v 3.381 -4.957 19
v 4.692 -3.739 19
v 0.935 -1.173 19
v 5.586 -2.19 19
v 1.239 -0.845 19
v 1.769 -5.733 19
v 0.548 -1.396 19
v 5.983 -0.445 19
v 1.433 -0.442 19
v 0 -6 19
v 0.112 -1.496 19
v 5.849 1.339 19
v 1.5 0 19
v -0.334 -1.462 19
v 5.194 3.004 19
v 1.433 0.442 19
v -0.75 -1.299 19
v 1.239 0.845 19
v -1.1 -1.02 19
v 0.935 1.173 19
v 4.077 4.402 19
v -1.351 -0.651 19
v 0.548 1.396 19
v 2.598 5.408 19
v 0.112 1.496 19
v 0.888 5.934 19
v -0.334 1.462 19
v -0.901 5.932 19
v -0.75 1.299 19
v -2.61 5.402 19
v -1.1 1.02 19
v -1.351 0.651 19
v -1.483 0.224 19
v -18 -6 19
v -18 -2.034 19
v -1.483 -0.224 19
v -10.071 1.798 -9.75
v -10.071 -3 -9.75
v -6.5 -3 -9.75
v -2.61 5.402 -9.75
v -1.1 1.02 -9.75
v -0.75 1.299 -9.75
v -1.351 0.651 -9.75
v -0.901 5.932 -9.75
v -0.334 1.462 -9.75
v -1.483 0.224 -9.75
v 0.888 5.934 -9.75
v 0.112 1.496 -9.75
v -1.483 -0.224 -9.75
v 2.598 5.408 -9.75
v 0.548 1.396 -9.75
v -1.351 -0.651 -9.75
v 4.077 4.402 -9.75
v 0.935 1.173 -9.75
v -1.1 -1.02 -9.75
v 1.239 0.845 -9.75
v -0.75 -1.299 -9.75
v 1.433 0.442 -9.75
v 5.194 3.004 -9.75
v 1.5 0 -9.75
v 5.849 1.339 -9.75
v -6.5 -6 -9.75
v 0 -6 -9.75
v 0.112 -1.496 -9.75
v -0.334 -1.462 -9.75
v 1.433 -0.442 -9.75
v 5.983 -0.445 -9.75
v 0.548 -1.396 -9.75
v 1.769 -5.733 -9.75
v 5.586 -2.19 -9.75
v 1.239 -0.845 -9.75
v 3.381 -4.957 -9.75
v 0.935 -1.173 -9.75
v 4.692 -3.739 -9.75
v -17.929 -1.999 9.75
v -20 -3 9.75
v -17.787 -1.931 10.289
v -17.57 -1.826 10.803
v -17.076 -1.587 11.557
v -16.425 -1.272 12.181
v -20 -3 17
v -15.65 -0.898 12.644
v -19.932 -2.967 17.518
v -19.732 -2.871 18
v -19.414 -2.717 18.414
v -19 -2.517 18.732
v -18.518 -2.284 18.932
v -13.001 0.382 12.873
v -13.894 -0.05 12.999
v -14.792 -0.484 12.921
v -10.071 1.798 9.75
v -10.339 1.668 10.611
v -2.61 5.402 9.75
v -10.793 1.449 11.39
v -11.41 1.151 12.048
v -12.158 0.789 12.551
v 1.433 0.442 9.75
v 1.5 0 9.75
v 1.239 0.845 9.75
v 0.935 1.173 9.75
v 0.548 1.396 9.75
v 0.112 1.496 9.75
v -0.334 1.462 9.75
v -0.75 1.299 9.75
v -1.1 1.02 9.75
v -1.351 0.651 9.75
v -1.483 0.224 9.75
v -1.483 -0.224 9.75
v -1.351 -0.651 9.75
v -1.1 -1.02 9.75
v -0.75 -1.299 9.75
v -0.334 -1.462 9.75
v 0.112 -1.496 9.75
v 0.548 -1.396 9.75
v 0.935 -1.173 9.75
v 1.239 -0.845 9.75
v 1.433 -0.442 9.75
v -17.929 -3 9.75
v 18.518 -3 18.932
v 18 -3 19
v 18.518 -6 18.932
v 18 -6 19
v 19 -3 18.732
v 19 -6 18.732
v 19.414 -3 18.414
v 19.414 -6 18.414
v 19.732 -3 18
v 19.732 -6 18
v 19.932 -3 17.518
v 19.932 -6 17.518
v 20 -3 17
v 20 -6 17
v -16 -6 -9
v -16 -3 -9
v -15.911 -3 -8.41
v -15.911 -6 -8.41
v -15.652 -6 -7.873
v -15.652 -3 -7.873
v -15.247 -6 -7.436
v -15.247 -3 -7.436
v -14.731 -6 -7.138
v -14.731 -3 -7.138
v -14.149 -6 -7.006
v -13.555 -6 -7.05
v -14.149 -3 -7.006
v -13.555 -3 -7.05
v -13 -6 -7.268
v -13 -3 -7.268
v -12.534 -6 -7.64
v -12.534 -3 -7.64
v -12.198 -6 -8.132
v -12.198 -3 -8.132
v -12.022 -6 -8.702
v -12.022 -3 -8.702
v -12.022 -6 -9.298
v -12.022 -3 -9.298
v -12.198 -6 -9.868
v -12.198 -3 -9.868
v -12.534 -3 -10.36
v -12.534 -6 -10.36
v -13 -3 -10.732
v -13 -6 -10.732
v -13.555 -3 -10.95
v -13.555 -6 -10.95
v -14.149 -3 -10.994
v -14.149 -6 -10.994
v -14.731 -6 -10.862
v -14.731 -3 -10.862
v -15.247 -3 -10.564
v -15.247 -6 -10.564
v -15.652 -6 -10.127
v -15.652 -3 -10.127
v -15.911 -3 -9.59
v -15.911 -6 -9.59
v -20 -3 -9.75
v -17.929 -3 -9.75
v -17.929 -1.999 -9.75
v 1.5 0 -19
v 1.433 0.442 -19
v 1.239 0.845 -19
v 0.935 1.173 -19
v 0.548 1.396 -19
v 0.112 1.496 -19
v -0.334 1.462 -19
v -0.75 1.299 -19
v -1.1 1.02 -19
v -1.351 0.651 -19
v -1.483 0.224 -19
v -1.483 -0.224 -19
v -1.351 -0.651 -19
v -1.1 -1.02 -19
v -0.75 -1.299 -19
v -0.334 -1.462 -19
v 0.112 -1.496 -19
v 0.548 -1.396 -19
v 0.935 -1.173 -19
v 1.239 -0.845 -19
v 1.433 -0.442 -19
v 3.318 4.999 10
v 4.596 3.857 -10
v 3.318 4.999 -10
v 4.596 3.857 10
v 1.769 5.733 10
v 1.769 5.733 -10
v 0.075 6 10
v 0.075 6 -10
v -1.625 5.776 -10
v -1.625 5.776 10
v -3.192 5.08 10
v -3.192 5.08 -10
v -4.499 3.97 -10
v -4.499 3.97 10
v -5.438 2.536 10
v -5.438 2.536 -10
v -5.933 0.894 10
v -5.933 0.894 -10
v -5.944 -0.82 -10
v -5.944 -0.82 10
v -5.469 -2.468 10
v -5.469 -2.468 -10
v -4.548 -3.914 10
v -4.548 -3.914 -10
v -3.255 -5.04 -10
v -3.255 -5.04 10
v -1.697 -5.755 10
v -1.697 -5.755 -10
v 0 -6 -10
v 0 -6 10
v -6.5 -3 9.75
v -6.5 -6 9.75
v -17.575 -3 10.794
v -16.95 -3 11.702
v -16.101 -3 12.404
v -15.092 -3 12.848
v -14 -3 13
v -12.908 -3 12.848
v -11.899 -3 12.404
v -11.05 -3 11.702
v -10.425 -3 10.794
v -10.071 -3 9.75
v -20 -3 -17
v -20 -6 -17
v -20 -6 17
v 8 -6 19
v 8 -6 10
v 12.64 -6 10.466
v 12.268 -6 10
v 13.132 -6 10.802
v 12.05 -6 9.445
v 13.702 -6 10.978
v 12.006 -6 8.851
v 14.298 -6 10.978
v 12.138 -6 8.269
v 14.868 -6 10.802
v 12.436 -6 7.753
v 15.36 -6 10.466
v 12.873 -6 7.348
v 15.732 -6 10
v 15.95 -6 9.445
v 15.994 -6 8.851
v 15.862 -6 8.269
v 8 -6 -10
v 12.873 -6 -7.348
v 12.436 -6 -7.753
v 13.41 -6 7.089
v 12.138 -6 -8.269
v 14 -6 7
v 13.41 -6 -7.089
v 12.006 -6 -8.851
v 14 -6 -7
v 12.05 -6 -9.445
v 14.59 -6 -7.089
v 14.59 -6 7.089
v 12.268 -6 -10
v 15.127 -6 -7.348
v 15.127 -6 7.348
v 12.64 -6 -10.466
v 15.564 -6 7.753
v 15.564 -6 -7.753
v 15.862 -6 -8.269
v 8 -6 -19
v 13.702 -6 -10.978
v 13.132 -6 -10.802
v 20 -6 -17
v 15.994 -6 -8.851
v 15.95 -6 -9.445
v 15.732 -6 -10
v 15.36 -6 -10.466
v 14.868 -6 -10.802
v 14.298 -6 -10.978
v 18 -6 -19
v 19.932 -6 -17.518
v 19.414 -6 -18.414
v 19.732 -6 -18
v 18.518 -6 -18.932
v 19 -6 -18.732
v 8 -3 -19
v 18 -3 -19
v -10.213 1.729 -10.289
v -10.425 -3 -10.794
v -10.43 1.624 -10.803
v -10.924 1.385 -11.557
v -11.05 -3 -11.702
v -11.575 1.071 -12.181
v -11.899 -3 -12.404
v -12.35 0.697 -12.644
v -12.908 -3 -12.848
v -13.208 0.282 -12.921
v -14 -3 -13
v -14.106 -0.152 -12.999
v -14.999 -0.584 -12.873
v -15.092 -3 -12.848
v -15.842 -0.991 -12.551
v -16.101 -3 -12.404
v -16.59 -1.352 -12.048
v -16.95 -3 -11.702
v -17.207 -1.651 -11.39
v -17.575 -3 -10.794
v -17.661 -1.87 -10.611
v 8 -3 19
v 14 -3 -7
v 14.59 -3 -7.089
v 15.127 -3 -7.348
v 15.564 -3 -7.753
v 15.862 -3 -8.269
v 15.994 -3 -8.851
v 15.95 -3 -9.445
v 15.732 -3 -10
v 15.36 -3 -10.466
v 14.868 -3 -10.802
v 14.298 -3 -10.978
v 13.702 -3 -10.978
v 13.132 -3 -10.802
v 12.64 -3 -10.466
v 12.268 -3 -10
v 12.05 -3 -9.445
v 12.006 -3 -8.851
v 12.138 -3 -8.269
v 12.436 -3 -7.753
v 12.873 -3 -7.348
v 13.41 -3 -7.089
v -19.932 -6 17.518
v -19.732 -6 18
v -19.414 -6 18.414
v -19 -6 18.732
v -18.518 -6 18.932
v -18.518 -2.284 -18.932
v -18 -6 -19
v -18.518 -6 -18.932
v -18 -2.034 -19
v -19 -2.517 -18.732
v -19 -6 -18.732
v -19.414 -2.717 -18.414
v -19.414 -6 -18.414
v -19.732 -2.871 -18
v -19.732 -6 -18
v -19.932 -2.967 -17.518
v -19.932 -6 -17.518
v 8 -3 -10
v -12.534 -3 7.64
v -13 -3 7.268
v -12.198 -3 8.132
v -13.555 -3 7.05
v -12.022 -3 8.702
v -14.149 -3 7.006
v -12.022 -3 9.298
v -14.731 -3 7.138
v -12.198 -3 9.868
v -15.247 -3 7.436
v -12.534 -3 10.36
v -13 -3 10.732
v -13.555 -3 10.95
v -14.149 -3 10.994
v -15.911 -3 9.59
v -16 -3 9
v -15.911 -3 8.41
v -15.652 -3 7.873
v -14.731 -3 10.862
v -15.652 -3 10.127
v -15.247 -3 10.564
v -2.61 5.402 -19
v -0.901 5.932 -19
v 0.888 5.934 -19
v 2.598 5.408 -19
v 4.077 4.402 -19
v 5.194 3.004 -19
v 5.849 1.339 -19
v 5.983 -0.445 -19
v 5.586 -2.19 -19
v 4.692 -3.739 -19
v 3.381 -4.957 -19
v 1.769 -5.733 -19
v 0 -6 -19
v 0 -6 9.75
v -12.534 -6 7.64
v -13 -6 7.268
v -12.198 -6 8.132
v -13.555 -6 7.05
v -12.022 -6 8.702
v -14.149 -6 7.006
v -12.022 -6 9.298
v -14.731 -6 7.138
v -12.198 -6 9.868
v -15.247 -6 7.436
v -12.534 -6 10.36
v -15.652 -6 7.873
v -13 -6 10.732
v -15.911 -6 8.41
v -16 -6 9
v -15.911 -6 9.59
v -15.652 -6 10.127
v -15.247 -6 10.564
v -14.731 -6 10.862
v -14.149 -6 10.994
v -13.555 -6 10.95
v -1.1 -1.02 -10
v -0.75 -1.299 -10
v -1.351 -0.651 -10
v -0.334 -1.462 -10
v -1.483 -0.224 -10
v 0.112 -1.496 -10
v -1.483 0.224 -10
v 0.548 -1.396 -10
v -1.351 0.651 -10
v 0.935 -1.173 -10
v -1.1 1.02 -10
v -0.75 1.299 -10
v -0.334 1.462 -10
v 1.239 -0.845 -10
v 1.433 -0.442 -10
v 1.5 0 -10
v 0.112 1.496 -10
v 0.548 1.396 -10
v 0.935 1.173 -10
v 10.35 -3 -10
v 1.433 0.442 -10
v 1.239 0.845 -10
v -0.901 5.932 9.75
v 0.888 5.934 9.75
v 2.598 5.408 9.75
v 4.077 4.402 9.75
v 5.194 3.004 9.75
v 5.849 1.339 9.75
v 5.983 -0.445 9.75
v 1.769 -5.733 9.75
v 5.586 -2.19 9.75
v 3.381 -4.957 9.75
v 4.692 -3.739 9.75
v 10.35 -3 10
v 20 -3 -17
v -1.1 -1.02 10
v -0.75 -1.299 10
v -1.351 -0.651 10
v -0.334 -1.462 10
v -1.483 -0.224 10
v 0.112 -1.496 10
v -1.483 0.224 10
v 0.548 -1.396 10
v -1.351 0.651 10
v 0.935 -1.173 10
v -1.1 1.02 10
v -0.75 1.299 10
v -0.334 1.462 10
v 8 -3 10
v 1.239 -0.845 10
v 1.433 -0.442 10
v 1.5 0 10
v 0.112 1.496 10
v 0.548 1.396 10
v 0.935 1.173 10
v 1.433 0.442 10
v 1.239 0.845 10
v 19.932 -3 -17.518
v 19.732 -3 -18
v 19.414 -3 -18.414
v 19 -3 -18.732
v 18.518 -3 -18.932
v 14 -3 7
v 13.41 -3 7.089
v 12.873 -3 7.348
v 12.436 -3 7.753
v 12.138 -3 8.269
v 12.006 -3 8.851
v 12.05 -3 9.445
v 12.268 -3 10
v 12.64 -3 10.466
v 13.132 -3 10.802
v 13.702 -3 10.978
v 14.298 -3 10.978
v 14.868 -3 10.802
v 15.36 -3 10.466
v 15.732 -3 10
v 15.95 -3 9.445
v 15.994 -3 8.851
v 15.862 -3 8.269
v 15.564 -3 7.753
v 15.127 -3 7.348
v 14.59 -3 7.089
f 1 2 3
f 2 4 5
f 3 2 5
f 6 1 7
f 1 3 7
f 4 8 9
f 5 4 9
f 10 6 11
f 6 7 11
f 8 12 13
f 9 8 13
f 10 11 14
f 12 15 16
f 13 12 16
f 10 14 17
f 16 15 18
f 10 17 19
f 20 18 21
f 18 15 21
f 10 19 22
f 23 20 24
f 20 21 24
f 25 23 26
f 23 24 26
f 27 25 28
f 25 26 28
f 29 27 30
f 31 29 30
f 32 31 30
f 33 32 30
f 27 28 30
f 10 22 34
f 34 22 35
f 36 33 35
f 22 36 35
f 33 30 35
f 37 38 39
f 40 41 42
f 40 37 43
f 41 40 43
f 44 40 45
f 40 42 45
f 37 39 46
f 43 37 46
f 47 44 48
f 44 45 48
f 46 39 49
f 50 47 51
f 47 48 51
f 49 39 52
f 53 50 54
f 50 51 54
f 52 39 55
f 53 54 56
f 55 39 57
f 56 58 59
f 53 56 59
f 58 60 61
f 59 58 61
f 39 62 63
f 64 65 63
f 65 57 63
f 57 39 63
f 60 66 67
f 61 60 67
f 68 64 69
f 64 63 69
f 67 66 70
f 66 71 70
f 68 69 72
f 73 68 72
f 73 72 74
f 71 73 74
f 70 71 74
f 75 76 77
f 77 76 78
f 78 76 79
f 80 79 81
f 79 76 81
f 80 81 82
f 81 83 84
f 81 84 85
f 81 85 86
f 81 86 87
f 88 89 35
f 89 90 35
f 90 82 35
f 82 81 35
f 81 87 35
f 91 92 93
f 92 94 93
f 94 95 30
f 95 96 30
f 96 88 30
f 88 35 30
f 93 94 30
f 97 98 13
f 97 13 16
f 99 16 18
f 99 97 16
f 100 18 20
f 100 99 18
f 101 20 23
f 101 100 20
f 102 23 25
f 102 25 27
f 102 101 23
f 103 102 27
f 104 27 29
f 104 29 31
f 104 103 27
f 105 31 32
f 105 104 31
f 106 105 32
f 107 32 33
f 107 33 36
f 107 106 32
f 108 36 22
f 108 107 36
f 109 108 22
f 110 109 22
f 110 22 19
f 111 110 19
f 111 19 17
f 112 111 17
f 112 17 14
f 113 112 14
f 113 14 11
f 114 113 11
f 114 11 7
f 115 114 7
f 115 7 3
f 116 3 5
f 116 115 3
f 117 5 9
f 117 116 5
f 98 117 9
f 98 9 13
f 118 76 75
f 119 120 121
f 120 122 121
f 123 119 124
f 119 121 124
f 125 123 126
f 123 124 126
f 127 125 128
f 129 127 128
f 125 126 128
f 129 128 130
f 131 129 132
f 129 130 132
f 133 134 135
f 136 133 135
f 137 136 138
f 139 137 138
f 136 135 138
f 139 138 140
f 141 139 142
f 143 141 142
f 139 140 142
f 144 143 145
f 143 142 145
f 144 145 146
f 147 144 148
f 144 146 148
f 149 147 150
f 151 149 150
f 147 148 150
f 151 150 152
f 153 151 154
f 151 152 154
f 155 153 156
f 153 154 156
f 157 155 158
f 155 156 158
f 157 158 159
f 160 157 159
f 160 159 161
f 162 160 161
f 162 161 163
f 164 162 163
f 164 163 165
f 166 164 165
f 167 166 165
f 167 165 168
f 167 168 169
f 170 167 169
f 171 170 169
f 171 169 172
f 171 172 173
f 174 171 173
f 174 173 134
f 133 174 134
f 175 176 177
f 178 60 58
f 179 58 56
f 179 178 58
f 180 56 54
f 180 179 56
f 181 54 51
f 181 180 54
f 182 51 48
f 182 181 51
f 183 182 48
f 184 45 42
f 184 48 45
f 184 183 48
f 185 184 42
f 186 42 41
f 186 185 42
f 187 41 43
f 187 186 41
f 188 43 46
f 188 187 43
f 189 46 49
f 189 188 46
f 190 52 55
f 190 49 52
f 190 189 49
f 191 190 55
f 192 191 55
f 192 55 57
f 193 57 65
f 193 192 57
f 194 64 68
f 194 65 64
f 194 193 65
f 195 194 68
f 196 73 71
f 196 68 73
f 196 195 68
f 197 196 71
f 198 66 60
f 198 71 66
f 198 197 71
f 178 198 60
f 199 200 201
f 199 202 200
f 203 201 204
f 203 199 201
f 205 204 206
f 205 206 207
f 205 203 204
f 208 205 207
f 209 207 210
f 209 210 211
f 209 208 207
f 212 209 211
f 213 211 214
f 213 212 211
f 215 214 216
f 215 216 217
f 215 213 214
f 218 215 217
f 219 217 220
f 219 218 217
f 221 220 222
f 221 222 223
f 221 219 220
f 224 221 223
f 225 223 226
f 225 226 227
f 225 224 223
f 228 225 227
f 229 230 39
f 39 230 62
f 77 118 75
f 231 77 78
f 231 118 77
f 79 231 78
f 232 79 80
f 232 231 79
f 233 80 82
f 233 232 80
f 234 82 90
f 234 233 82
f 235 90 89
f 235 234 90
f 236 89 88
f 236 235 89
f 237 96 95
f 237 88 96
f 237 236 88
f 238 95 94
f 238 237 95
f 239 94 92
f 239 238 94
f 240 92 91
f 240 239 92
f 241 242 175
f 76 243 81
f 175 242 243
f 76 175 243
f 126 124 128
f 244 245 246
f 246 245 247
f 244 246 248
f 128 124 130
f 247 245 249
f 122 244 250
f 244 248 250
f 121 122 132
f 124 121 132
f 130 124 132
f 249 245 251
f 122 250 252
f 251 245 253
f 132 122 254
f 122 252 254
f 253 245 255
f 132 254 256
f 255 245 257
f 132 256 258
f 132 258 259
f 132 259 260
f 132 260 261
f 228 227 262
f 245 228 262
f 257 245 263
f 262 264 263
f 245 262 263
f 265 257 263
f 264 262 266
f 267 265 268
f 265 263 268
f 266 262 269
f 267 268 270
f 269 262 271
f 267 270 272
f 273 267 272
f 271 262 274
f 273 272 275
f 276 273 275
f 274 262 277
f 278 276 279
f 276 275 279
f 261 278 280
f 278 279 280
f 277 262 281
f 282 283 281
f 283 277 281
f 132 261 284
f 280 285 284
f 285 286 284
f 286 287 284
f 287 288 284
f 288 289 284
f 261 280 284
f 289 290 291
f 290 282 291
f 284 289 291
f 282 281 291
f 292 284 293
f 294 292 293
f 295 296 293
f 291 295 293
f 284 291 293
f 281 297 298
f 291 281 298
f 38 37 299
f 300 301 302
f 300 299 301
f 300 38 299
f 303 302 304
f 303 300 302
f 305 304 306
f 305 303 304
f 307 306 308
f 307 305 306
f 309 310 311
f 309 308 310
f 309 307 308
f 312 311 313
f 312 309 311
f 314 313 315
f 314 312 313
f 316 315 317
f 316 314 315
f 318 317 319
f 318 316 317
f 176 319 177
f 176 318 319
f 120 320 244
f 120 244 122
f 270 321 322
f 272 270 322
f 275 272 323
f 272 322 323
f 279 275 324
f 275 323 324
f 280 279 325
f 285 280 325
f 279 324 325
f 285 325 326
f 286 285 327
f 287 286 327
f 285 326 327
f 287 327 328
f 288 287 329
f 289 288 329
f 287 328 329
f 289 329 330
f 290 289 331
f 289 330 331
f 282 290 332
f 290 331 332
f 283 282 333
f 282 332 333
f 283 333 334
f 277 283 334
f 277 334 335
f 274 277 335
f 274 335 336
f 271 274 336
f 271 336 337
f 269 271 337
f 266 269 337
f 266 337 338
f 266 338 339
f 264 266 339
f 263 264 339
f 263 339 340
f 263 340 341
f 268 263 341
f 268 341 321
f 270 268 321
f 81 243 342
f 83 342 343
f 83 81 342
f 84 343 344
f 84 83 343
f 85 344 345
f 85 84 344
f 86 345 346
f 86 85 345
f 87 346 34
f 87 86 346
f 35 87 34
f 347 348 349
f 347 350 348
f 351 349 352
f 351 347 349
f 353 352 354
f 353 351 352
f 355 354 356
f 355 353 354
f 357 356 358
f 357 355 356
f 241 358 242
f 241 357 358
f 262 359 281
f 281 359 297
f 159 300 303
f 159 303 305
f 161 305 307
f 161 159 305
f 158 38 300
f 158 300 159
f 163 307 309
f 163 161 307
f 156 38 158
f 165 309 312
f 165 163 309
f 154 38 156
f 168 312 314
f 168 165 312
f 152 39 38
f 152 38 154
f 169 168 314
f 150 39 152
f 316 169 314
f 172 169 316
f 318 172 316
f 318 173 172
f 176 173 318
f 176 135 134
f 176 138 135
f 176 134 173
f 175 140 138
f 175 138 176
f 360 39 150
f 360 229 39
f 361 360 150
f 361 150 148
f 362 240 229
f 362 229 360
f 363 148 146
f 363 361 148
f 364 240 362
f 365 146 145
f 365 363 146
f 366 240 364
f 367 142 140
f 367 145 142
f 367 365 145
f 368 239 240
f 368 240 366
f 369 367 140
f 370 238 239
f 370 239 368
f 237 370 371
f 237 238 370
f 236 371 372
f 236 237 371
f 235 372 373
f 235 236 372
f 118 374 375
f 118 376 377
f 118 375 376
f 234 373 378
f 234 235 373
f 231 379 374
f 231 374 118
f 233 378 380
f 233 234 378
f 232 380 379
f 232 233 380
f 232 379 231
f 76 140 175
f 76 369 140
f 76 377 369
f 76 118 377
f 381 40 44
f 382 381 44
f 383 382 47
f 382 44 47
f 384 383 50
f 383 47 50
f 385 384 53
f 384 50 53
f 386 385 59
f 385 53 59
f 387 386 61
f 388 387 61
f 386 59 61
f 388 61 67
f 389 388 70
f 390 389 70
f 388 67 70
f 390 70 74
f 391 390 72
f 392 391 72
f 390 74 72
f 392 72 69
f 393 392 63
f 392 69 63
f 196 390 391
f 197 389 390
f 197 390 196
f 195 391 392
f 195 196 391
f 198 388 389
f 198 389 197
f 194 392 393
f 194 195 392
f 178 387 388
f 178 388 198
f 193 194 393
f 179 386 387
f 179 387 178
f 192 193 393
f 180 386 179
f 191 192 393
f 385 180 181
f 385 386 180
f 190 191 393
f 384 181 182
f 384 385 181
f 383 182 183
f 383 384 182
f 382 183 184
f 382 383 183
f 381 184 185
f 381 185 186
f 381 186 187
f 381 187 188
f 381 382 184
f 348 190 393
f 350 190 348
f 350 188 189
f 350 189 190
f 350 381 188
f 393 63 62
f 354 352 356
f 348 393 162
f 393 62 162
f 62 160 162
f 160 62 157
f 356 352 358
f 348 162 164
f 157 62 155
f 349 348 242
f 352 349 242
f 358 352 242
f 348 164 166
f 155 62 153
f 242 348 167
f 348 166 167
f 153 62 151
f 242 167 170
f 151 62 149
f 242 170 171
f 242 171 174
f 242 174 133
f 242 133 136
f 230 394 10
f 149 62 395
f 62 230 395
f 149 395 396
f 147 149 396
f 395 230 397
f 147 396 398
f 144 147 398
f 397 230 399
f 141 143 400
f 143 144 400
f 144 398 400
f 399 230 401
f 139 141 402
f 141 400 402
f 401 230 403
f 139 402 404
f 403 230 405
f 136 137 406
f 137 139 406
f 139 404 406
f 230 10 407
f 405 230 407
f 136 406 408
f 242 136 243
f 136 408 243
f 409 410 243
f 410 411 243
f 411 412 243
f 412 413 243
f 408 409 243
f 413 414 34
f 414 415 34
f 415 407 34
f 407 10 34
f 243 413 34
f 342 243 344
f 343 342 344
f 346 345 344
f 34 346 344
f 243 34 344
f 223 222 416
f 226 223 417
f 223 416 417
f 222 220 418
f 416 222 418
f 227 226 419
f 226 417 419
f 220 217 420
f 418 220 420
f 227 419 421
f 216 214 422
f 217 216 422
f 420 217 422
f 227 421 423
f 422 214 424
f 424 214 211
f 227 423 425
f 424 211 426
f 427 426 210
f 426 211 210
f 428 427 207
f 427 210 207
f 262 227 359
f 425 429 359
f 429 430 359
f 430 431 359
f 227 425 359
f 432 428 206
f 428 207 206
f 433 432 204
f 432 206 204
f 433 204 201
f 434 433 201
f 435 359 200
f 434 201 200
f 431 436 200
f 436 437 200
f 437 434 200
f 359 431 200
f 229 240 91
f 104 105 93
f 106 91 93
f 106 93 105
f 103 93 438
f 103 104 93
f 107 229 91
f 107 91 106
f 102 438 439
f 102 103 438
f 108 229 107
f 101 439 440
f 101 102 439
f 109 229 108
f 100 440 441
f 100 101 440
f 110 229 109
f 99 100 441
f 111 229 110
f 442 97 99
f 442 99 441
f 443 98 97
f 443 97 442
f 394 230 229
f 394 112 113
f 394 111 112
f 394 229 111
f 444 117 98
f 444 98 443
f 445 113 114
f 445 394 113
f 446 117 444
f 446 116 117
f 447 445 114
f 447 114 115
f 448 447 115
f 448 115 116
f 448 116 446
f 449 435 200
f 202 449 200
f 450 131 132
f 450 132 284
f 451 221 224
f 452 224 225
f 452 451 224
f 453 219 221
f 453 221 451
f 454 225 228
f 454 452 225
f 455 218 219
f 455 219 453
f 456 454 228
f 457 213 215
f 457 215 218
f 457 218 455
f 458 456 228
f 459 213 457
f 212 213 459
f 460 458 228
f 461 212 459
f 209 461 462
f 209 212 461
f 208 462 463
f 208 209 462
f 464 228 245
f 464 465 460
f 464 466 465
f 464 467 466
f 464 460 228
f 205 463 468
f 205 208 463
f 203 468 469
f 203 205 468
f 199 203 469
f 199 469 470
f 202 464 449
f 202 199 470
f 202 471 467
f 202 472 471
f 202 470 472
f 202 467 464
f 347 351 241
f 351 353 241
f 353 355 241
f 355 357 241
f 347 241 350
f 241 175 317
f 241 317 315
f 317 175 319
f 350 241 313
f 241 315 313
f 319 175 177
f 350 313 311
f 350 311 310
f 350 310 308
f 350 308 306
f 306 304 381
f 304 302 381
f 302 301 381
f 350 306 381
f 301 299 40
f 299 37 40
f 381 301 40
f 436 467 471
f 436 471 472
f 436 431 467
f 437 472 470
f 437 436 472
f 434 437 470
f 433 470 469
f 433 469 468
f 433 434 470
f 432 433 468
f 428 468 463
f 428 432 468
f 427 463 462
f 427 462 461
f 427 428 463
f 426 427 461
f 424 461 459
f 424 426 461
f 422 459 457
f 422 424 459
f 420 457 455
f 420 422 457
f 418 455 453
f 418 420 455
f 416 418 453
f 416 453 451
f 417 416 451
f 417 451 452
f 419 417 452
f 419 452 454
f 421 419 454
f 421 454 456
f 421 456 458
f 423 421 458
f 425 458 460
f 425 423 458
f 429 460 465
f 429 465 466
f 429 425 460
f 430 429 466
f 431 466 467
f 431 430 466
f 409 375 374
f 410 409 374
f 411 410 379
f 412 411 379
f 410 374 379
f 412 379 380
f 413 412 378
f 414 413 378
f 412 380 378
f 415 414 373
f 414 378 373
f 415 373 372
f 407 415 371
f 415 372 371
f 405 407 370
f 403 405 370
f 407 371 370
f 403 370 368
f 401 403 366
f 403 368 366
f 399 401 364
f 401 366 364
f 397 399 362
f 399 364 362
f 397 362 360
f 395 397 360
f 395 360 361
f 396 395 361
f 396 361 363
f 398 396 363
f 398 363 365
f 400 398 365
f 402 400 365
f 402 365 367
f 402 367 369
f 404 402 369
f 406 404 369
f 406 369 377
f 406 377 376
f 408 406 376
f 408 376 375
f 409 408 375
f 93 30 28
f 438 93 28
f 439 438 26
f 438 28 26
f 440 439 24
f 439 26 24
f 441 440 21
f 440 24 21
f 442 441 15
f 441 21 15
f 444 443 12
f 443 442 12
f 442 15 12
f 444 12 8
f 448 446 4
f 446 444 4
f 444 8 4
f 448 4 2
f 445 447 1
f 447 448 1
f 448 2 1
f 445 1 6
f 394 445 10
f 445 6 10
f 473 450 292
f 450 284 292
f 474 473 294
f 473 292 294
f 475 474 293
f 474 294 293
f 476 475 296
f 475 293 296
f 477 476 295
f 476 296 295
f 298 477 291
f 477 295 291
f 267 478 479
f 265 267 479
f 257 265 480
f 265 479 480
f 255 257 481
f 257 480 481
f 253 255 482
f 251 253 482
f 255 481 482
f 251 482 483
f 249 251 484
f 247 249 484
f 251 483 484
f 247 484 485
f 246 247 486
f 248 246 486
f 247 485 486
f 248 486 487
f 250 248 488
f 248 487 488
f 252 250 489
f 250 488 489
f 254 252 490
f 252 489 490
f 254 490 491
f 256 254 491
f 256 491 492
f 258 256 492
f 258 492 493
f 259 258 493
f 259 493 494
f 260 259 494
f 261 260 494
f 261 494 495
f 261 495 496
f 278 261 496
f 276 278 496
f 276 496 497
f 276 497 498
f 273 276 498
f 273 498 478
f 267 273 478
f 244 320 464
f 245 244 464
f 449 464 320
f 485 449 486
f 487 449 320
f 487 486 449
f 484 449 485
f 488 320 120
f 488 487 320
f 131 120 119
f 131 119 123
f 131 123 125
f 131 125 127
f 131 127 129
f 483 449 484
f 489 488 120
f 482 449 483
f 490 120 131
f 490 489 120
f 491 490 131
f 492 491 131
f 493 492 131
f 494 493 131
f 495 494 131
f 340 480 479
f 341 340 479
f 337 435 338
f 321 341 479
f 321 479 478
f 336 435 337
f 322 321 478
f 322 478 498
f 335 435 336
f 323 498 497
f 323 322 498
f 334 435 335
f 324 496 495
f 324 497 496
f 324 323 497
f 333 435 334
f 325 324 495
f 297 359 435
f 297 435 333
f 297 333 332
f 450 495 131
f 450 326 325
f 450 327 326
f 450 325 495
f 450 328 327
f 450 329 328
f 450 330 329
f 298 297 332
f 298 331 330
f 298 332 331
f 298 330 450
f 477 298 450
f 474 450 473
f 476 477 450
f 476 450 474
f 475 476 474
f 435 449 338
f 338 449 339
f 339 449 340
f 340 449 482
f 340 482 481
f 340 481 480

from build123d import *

# Parameters (mm, degrees)
SKETCH_1_R               = 1.5
EXTRUDE_1_DEPTH          = 10
SKETCH_2_W               = 12
SKETCH_2_H               = 38
EXTRUDE_2_DEPTH          = 3
SKETCH_3_R               = 1.5
EXTRUDE_3_DEPTH          = 19
CUT_EXTRUDE_1_DEPTH      = 29.231188427
CUT_EXTRUDE_1_DEPTH_BACK = 29.231188427
SKETCH_4_W               = 13
SKETCH_4_H               = 19.5
CUT_EXTRUDE_START        = -3
CUT_EXTRUDE_2_DEPTH      = 28.083217913
SKETCH_6_R               = 2
CUT_EXTRUDE_3_DEPTH      = 30.017236257
SKETCH_7_R               = 2
CUT_EXTRUDE_4_DEPTH      = 30.017236257
FILLET_1_R               = 2
FILLET_2_R               = 2


with BuildPart() as part:
    # 草图1 → 凸台-拉伸1 (new, symmetric)
    with BuildSketch(Plane.XY):
        with BuildLine():
            Line((0, -6), (20, -6))
            Line((20, -6), (20, -3))
            Line((20, -3), (10.34974263, -3))
            Line((10.34974263, -3), (4.596266659, 3.856725658))
            ThreePointArc((4.596266659, 3.856725658), (-5.437846722, 2.53570957), (0, -6))
        make_face()
        Circle(SKETCH_1_R, mode=Mode.SUBTRACT)
    extrude(amount=EXTRUDE_1_DEPTH, both=True)

    # 草图2 → 凸台-拉伸2 (add)
    with BuildSketch(Plane(origin=(0, -3, 0), x_dir=(1, 0, 0), z_dir=(0, 1, 0))):
        with Locations((14, 0)):
            Rectangle(SKETCH_2_W, SKETCH_2_H)
    extrude(amount=-EXTRUDE_2_DEPTH)

    # 草图7 → 切除-拉伸4 (cut, through all)
    with BuildSketch(Plane(origin=(0, -3, 0), x_dir=(1, 0, 0), z_dir=(0, 1, 0))):
        with Locations(Location((14, 9, 0), (0, 0, 270))):
            Circle(SKETCH_7_R)
        with Locations(Location((14, -9, 0), (0, 0, 90))):
            Circle(SKETCH_7_R)
    extrude(amount=-CUT_EXTRUDE_4_DEPTH, mode=Mode.SUBTRACT)

    # 圆角2
    fillet_2_edges = [part.edges().sort_by_distance(p)[0] for p in [
        (20, -4.5, -19),
        (20, -4.5, 19),
    ]]
    fillet(fillet_2_edges, radius=FILLET_2_R)


with BuildPart() as body_2:
    # 草图3 → 凸台-拉伸3 (new, symmetric)
    with BuildSketch(Plane.XY):
        with BuildLine():
            Line((0, -6), (-20, -6))
            Line((-20, -6), (-20, -3))
            Line((-20, -3), (-2.610361229, 5.40240819))
            ThreePointArc((-2.610361229, 5.40240819), (5.848694262, 1.338945641), (0, -6))
        make_face()
        Circle(SKETCH_3_R, mode=Mode.SUBTRACT)
    extrude(amount=EXTRUDE_3_DEPTH, both=True)

    # 草图4 → 切除-拉伸1 (cut, two sides: drawn at the far end of the back side and taken through both)
    with BuildSketch(Plane(origin=(0, 0, 0), x_dir=(1, 0, 0), z_dir=(0, 1, 0)).offset(-CUT_EXTRUDE_1_DEPTH_BACK)):
        Rectangle(SKETCH_4_W, SKETCH_4_H)
    extrude(amount=CUT_EXTRUDE_1_DEPTH + CUT_EXTRUDE_1_DEPTH_BACK, mode=Mode.SUBTRACT)

    # 草图5 → 切除-拉伸2 (cut, through all)
    with BuildSketch(Plane.XZ.offset(6).offset(CUT_EXTRUDE_START)):
        with BuildLine():
            Line((-33.5, 9.75), (-17.929058411, 9.75))
            ThreePointArc((-17.929058411, 9.75), (-14, 13), (-10.070941589, 9.75))
            Line((-10.070941589, 9.75), (-6.5, 9.75))
            Line((-6.5, 9.75), (-6.5, -9.75))
            Line((-6.5, -9.75), (-10.070941589, -9.75))
            ThreePointArc((-10.070941589, -9.75), (-14, -13), (-17.929058411, -9.75))
            Line((-17.929058411, -9.75), (-33.5, -9.75))
            Line((-33.5, -9.75), (-33.5, 9.75))
        make_face()
    extrude(amount=-CUT_EXTRUDE_2_DEPTH, mode=Mode.SUBTRACT)

    # 草图6 → 切除-拉伸3 (cut, through all)
    with BuildSketch(Plane(origin=(0, -3, 0), x_dir=(1, 0, 0), z_dir=(0, 1, 0))):
        with Locations(Location((-14, 9, 0), (0, 0, 180))):
            Circle(SKETCH_6_R)
        with Locations(Location((-14, -9, 0), (0, 0, 180))):
            Circle(SKETCH_6_R)
    extrude(amount=-CUT_EXTRUDE_3_DEPTH, mode=Mode.SUBTRACT)

    # 圆角1
    fillet_1_edges = [body_2.edges().sort_by_distance(p)[0] for p in [
        (-20, -4.5, 19),
        (-20, -4.5, -19),
    ]]
    fillet(fillet_1_edges, radius=FILLET_1_R)


solid = Compound([part.part, body_2.part])
